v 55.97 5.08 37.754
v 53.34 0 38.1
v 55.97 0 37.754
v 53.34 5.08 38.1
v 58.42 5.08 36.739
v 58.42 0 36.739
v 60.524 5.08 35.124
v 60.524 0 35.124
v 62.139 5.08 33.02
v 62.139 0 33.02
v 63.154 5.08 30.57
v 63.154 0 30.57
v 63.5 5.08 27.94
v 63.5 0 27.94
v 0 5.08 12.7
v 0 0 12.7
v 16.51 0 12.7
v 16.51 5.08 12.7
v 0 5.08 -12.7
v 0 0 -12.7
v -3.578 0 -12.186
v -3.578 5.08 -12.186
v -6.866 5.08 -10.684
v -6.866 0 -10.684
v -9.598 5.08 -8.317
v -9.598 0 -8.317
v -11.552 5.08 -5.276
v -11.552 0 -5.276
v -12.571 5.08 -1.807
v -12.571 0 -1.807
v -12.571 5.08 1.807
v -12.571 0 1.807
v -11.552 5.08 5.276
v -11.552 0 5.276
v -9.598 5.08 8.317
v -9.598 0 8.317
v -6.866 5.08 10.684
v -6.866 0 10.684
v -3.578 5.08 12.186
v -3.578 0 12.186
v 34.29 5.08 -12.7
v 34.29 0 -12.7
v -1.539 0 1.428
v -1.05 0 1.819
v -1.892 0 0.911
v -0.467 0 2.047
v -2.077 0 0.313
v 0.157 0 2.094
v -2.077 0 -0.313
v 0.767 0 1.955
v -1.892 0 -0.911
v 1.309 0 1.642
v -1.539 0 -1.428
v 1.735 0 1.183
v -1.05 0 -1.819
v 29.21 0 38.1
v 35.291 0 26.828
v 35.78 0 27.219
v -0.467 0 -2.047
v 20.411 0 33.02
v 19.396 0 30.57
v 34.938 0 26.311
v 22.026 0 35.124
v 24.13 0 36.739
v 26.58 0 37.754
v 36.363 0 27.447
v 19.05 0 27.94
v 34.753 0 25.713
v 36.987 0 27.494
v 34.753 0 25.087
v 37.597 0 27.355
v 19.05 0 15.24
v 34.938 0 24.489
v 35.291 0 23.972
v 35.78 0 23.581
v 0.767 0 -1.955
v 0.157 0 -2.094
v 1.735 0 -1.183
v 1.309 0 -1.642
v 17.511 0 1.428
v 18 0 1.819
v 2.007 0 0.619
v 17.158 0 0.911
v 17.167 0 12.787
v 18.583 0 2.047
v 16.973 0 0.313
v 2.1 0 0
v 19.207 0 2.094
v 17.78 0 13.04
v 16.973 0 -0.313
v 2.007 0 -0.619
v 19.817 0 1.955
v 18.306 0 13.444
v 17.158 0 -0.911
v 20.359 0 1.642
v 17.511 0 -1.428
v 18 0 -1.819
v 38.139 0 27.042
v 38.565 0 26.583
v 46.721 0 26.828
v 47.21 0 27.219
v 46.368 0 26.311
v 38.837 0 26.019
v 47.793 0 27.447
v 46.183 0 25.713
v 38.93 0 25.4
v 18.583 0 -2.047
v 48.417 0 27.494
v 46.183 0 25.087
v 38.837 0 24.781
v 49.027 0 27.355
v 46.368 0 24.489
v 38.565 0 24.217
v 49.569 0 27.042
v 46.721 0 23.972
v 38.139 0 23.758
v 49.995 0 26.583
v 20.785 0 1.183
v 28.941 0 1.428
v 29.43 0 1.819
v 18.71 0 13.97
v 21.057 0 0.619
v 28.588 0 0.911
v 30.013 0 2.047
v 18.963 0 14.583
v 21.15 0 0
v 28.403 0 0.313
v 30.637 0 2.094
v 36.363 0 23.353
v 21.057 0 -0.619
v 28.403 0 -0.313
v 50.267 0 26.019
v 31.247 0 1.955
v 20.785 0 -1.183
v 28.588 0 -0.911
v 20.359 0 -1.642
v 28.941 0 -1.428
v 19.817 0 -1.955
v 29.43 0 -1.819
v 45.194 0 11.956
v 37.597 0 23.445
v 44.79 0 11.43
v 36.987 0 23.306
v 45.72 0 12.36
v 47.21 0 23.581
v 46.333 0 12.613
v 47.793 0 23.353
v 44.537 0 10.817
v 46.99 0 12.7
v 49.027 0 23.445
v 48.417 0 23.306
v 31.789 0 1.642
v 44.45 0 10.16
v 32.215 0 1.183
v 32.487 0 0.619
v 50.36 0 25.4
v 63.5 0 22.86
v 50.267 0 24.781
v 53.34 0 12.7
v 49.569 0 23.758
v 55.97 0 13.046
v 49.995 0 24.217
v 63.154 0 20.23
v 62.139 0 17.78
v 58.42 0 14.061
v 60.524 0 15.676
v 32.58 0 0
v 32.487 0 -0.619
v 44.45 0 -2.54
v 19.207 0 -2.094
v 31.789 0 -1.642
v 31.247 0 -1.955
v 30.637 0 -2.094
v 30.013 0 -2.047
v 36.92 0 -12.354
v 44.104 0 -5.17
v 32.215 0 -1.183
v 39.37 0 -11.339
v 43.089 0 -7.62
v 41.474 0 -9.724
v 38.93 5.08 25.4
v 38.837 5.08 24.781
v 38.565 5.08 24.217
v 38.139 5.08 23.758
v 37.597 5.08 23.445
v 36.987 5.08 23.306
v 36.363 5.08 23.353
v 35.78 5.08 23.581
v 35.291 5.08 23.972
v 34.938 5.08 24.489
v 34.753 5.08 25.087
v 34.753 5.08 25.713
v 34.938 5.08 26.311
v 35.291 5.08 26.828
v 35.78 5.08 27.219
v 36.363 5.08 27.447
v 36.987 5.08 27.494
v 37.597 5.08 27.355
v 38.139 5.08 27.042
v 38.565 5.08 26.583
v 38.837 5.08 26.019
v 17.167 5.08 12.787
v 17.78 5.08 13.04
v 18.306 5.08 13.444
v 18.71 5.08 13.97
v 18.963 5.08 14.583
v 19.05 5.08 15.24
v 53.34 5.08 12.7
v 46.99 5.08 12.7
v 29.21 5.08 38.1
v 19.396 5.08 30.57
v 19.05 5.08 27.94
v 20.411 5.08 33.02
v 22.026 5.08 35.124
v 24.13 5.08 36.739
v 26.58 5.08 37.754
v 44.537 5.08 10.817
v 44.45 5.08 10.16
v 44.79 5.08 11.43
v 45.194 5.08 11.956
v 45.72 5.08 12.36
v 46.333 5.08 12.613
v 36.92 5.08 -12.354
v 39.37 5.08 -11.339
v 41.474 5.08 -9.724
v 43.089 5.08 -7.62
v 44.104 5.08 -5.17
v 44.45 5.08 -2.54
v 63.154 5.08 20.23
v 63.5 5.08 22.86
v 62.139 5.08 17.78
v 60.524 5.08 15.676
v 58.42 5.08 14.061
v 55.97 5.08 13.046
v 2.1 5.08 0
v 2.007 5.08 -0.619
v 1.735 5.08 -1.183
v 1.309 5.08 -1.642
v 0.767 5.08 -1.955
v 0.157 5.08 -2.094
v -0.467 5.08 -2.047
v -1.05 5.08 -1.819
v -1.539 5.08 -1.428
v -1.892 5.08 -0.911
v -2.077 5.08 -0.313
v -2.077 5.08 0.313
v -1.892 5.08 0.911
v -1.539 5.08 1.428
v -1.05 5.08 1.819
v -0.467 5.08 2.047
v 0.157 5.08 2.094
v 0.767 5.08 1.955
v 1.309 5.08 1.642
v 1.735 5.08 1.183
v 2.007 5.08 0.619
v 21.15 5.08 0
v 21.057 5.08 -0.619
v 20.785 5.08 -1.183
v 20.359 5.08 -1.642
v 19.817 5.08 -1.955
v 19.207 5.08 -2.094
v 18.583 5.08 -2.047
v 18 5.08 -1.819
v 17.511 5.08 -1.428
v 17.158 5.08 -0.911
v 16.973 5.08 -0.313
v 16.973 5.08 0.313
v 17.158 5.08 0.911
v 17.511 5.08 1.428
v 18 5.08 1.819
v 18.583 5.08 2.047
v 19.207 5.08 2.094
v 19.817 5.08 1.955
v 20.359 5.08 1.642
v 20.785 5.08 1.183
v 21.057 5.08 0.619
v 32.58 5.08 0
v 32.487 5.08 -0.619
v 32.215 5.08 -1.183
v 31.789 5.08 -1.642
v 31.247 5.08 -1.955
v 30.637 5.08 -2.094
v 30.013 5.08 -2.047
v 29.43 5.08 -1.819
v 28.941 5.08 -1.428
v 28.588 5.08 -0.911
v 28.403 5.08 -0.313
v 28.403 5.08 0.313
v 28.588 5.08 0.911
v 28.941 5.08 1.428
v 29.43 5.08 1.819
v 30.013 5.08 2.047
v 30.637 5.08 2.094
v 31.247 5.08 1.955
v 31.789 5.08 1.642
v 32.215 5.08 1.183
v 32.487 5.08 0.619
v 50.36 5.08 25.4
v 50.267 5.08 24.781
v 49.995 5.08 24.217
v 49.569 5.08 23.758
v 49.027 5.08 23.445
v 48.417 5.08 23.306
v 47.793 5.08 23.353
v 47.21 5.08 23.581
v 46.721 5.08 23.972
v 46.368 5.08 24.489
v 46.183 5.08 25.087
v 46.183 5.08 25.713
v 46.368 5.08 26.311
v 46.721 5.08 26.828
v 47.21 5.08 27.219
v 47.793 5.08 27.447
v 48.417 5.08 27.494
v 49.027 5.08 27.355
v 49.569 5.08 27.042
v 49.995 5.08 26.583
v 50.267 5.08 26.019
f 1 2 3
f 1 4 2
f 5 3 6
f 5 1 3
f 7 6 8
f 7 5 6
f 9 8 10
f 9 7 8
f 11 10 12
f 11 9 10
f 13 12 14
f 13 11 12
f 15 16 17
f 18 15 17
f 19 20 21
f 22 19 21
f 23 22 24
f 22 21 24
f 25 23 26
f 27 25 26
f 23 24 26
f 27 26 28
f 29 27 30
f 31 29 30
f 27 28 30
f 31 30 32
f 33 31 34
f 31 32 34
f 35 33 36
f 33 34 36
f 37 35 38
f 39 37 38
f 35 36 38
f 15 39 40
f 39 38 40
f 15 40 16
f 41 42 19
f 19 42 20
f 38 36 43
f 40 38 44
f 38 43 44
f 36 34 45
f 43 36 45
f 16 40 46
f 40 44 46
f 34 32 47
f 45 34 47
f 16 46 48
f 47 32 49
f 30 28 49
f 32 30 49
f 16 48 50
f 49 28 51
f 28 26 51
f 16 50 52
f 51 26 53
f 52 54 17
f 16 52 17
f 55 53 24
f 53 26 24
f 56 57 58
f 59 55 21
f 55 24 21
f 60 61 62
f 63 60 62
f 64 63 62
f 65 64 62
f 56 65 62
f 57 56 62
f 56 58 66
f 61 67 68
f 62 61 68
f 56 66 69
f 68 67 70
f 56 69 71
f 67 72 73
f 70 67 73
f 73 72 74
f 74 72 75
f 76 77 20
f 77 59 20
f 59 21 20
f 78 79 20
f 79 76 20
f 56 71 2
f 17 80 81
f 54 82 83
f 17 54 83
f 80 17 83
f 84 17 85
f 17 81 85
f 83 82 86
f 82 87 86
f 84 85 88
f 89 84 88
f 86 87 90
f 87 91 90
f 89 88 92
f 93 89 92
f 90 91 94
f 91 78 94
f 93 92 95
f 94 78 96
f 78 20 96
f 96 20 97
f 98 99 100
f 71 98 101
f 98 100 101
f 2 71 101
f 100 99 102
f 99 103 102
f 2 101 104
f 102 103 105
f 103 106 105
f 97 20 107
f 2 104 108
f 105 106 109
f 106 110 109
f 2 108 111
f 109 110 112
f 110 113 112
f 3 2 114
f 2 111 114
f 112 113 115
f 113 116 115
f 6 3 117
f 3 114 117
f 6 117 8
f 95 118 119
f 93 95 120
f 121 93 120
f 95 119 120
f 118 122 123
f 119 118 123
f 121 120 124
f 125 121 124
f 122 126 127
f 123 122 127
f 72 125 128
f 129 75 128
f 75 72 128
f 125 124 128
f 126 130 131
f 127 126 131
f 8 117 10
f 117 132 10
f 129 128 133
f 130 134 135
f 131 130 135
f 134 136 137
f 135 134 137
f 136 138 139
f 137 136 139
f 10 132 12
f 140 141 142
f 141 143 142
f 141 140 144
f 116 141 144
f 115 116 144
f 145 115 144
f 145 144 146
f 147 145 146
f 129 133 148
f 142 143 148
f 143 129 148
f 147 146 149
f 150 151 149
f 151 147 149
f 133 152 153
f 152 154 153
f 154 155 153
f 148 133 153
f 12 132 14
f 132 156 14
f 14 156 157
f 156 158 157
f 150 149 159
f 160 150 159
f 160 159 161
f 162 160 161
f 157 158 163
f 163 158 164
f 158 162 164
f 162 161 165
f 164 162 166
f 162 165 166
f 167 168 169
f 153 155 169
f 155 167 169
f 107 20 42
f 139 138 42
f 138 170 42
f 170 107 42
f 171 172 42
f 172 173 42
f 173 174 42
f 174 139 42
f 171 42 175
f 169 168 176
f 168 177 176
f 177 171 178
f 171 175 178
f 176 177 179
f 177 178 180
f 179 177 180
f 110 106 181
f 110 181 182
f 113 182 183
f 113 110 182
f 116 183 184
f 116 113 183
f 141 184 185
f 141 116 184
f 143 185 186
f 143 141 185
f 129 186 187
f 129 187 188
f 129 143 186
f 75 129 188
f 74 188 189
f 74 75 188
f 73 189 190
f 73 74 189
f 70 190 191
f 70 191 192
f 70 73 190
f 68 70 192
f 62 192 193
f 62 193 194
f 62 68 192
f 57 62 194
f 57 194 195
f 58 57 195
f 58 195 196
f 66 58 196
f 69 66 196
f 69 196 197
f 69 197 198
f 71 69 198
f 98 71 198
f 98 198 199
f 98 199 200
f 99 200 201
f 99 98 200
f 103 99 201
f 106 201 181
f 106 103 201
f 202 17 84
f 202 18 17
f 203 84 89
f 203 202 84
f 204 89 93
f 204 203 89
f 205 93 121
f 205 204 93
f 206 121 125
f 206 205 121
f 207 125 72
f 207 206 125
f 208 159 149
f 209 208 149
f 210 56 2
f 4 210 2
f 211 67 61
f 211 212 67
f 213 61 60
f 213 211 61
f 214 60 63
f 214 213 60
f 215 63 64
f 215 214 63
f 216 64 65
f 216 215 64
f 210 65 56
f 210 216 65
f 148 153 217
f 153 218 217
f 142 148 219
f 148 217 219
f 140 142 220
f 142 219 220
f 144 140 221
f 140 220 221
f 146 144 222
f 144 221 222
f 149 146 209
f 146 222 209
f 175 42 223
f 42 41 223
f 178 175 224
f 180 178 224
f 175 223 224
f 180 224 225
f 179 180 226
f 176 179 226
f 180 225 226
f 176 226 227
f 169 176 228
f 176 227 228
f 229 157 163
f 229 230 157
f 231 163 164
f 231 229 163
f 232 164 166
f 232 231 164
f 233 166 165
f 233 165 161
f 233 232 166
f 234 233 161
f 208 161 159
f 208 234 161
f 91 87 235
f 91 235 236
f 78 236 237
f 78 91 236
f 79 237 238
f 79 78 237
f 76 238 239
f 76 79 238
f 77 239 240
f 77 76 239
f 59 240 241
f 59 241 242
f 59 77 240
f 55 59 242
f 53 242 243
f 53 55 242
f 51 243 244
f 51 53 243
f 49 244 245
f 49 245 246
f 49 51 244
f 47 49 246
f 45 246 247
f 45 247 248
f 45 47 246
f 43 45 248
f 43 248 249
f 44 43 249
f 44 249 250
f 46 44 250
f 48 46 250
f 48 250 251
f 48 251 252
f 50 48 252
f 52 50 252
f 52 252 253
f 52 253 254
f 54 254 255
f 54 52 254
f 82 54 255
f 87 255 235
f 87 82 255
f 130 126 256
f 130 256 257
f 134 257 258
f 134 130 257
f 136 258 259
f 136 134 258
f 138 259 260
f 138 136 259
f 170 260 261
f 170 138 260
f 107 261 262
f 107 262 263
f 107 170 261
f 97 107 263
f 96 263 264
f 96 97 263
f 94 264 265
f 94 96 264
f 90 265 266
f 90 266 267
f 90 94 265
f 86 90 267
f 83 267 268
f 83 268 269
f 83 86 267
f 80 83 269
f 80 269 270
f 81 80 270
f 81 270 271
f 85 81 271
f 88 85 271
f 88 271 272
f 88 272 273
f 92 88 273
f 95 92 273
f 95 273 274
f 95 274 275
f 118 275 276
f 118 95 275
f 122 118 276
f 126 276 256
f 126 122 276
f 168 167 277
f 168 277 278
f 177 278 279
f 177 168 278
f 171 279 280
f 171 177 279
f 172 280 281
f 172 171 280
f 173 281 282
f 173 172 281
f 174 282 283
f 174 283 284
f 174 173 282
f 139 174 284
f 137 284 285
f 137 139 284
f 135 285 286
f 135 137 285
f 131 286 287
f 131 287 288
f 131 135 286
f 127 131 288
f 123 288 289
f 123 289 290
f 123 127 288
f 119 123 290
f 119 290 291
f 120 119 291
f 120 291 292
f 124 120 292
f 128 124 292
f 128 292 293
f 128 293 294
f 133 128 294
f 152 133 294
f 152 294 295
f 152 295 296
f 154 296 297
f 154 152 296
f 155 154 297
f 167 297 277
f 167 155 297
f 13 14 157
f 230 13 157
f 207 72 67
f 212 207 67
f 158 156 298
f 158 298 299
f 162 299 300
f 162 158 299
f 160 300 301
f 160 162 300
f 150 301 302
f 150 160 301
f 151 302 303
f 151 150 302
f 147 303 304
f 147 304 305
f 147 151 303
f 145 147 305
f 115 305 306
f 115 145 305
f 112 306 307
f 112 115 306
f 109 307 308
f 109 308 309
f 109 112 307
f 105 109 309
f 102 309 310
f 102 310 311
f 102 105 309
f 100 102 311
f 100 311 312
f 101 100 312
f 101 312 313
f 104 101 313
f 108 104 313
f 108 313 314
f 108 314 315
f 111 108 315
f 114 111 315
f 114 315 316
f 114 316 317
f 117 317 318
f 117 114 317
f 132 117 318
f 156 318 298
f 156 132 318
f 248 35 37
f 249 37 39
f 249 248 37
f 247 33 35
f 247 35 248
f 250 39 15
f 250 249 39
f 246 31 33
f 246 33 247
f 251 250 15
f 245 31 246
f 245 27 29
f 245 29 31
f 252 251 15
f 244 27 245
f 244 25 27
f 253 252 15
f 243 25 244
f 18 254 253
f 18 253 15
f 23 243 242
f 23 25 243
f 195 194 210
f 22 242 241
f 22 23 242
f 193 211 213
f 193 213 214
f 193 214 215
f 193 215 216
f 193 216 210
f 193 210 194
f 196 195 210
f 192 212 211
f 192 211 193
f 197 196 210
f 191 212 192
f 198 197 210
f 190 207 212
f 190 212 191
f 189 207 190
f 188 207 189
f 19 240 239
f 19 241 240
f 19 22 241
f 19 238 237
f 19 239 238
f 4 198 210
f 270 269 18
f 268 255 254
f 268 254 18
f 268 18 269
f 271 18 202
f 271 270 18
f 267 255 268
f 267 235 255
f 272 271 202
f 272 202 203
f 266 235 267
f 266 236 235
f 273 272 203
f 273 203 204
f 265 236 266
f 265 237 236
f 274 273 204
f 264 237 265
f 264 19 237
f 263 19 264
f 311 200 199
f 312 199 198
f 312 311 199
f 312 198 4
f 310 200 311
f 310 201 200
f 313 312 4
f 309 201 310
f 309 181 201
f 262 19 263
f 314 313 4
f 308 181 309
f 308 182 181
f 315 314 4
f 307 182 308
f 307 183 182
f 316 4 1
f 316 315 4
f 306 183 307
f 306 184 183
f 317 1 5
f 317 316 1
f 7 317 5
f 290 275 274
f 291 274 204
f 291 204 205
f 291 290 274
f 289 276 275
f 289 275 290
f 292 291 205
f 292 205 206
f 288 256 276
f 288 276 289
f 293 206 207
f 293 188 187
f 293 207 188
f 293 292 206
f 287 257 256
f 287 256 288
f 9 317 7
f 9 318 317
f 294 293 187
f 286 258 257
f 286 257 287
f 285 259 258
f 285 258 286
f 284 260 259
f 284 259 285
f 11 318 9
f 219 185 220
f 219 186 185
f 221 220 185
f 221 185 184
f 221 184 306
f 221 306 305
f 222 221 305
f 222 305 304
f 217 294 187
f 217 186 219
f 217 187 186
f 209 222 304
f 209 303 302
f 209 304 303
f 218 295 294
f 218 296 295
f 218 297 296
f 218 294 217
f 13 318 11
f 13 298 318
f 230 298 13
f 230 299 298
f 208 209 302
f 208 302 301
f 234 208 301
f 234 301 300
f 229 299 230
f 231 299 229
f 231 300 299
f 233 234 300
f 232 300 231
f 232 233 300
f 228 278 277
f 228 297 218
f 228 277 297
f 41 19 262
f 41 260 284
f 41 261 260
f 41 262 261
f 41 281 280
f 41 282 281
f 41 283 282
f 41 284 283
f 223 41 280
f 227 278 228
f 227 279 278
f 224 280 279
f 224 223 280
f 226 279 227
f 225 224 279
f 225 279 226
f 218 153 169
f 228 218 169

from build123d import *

# Parameters (mm, degrees)
SKETCH1_R           = 2.1
BOSS_EXTRUDE1_DEPTH = 5.08
FILLET1_R           = 2.54
FILLET2_R           = 10.16


with BuildPart() as part:
    # Sketch1 → Boss-Extrude1 (new body)
    with BuildSketch(Plane(origin=(0, 0, 0), x_dir=(1, 0, 0), z_dir=(0, 1, 0))):
        with BuildLine():
            ThreePointArc((0, 12.7), (-12.7, 0), (0, -12.7))
            Line((0, -12.7), (19.05, -12.7))
            Line((19.05, -12.7), (19.05, -38.1))
            Line((19.05, -38.1), (35.56, -38.1))
            Line((35.56, -38.1), (63.5, -38.1))
            Line((63.5, -38.1), (63.5, -12.7))
            Line((63.5, -12.7), (44.45, -12.7))
            Line((44.45, -12.7), (44.45, 12.7))
            Line((44.45, 12.7), (22.225, 12.7))
            Line((22.225, 12.7), (0, 12.7))
        make_face()
        with Locations((36.83, -25.4)):
            Circle(SKETCH1_R, mode=Mode.SUBTRACT)
        with Locations((48.26, -25.4)):
            Circle(SKETCH1_R, mode=Mode.SUBTRACT)
        Circle(SKETCH1_R, mode=Mode.SUBTRACT)
        with Locations((19.05, 0)):
            Circle(SKETCH1_R, mode=Mode.SUBTRACT)
        with Locations((30.48, 0)):
            Circle(SKETCH1_R, mode=Mode.SUBTRACT)
    extrude(amount=BOSS_EXTRUDE1_DEPTH)

    # Fillet1
    fillet1_edges = [part.edges().sort_by_distance(p)[0] for p in [
        (44.45, 2.54, 12.7),
        (19.05, 2.54, 12.7),
    ]]
    fillet(fillet1_edges, radius=FILLET1_R)

    # Fillet2
    fillet2_edges = [part.edges().sort_by_distance(p)[0] for p in [
        (44.45, 2.54, -12.7),
        (63.5, 2.54, 12.7),
        (63.5, 2.54, 38.1),
        (19.05, 2.54, 38.1),
    ]]
    fillet(fillet2_edges, radius=FILLET2_R)


solid = part.part
